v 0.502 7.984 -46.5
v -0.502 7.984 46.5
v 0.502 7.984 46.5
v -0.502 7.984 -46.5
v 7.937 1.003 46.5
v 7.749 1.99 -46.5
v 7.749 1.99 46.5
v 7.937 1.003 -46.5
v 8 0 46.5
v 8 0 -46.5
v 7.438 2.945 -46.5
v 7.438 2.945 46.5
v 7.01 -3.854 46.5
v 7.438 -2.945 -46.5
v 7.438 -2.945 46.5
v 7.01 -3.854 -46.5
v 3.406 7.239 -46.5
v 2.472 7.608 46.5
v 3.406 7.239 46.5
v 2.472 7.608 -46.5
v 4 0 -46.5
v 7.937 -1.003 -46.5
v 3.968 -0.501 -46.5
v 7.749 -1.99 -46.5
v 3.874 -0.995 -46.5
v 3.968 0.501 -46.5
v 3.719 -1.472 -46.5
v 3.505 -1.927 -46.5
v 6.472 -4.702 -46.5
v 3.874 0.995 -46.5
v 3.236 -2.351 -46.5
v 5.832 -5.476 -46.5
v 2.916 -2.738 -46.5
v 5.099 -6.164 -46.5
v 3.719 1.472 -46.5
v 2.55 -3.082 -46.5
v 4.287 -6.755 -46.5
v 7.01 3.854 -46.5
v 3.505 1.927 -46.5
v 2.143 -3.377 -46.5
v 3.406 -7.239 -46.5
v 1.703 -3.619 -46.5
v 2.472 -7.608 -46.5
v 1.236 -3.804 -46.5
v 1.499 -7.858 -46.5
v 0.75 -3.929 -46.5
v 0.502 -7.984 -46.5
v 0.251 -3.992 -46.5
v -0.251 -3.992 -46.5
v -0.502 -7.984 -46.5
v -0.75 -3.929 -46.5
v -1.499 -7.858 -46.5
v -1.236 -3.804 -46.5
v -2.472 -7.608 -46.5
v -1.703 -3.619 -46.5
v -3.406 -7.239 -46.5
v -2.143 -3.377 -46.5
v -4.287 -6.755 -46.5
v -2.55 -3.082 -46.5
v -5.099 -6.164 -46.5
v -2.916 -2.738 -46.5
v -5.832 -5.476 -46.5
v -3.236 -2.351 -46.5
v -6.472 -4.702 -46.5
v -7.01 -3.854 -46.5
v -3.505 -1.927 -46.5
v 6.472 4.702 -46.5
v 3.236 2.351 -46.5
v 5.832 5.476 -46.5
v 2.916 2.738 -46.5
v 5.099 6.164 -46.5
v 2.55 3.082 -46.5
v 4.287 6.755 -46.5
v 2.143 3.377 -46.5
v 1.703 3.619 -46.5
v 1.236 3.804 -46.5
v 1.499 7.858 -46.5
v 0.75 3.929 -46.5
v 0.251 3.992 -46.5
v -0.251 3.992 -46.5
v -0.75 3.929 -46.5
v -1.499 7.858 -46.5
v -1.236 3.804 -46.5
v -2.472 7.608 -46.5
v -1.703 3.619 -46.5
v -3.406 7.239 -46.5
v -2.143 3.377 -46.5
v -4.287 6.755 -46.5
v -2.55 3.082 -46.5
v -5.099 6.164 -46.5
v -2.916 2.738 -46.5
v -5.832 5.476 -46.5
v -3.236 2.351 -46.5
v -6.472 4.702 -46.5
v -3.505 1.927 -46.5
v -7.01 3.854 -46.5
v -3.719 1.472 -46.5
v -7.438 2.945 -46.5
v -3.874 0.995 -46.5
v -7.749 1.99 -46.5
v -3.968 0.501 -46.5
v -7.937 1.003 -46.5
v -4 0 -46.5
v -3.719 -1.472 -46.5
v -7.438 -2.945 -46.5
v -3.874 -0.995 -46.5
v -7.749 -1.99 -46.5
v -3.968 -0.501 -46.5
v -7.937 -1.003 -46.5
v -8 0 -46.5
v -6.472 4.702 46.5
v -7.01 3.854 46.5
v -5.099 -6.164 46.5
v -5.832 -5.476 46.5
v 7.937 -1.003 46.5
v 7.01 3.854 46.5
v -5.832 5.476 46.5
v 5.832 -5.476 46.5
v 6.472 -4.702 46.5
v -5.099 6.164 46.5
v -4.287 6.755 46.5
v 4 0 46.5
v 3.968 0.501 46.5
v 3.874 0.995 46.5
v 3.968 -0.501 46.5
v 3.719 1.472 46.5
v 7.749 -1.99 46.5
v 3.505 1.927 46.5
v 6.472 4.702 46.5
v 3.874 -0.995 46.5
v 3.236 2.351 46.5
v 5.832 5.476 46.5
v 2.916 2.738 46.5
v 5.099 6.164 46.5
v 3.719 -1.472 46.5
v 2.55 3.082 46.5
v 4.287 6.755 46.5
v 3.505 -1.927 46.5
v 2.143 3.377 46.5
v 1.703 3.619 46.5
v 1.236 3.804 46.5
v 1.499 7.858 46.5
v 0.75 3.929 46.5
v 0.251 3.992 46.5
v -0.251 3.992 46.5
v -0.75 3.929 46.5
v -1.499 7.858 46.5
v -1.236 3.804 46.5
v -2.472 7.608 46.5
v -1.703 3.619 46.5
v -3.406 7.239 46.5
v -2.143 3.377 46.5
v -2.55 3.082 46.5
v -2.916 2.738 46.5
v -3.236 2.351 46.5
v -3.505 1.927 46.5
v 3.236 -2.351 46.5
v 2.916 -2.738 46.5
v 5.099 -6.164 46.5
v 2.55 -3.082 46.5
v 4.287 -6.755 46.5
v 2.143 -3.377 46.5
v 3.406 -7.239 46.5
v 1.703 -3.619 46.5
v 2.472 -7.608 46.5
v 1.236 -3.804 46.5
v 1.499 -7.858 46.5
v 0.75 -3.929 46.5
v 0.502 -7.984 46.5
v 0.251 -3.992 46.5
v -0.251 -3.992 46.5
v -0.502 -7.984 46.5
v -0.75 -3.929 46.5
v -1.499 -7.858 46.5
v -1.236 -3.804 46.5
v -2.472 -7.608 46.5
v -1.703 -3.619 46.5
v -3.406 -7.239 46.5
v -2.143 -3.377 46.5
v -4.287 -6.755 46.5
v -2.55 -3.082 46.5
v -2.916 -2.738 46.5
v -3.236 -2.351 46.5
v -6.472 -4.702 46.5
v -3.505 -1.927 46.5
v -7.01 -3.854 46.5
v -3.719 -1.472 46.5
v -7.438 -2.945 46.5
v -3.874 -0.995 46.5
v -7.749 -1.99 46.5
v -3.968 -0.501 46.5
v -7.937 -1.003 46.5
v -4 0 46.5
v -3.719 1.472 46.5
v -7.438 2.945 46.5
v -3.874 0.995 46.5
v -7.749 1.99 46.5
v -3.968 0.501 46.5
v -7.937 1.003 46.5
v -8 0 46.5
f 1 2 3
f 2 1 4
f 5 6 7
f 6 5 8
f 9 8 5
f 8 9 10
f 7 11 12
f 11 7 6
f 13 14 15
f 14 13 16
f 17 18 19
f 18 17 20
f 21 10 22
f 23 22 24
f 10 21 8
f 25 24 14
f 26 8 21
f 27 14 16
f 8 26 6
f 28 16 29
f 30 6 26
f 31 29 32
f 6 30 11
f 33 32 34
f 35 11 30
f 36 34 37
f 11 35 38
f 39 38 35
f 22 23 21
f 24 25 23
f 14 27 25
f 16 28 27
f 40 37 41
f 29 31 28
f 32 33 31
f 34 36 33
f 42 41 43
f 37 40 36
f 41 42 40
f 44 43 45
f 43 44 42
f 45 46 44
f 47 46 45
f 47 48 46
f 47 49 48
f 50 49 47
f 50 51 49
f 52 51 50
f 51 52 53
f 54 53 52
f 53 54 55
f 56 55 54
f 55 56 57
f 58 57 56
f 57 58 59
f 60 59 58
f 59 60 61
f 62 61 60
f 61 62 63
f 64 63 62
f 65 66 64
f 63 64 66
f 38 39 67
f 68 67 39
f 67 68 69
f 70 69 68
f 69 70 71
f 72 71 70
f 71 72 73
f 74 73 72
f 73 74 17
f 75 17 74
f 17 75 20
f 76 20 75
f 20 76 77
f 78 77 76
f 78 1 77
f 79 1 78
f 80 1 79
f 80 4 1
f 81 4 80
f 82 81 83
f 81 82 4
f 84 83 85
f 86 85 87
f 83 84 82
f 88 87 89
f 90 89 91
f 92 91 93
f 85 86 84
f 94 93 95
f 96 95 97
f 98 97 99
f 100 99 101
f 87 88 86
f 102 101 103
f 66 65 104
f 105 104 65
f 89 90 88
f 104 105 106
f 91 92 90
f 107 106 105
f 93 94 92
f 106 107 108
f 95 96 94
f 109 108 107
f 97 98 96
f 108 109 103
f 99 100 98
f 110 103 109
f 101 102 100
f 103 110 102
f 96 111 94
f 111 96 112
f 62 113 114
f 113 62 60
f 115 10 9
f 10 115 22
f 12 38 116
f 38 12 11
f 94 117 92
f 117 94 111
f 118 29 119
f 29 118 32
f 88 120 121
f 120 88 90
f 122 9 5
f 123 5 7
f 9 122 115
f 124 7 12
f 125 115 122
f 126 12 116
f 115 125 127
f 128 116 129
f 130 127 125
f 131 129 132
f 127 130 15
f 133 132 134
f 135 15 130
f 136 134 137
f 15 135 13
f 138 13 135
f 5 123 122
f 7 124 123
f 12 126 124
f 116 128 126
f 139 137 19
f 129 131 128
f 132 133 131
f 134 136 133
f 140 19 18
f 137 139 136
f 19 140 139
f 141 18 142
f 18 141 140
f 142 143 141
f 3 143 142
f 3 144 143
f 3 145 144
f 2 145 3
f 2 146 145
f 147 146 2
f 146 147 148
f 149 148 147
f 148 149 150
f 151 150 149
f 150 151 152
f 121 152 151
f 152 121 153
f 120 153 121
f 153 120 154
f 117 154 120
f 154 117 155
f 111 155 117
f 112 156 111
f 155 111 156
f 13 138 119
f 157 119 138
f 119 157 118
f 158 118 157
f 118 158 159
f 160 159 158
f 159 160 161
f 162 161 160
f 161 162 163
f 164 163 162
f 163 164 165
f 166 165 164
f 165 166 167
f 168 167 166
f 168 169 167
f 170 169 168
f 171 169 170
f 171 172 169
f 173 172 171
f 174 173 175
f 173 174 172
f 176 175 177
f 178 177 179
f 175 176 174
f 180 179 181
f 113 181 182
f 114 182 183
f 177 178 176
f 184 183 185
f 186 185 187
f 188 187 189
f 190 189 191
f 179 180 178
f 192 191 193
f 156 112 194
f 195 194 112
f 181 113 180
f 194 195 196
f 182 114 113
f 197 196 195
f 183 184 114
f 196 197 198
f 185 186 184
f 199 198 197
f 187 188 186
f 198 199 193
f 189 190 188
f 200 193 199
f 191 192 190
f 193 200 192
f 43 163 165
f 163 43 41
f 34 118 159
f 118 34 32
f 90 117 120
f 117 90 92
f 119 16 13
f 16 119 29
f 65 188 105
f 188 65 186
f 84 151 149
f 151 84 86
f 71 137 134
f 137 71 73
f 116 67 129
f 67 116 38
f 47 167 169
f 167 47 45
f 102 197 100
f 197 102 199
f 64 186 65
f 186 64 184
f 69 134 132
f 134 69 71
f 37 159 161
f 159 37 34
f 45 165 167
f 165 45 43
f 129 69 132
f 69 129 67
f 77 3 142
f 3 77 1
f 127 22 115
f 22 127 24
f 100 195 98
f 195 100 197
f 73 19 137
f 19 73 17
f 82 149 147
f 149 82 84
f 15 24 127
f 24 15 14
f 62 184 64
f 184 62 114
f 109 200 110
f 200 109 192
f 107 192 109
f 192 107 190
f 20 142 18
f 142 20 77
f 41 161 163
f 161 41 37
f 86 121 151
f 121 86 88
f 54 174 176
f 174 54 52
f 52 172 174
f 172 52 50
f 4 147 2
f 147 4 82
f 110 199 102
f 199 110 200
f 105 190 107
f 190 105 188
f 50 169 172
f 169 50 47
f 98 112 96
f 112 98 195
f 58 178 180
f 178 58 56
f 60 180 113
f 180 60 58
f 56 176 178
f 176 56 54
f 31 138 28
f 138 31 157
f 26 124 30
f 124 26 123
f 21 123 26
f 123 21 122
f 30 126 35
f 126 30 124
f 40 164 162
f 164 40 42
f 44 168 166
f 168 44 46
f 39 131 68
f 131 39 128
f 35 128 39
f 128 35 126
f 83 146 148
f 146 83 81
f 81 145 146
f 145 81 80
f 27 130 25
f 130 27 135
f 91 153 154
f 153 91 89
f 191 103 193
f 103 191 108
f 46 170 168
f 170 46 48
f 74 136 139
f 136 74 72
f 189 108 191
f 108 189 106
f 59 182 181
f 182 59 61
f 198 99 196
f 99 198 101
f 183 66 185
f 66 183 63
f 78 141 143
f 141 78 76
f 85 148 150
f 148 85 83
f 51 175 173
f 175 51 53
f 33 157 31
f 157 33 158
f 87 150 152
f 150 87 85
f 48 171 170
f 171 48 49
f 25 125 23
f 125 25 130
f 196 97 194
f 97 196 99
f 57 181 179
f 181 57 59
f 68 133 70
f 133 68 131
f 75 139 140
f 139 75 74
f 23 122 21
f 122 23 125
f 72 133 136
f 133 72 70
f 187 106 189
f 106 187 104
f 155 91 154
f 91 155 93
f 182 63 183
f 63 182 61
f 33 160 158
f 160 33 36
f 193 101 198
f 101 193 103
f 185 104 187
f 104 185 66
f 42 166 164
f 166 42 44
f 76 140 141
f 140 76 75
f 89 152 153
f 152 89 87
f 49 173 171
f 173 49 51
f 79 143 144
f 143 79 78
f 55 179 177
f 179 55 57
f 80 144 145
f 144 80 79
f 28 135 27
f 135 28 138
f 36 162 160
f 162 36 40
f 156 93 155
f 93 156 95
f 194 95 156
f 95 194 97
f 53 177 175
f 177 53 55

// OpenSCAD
$fn = 50;


difference() {
	union() {
		translate(v = [0, 0, -46.5000000000]) {
			cylinder(h = 93, r = 8.0000000000);
		}
	}
	union() {
		translate(v = [0, 0, -100.0000000000]) {
			cylinder(h = 200, r = 4.0000000000);
		}
	}
}
